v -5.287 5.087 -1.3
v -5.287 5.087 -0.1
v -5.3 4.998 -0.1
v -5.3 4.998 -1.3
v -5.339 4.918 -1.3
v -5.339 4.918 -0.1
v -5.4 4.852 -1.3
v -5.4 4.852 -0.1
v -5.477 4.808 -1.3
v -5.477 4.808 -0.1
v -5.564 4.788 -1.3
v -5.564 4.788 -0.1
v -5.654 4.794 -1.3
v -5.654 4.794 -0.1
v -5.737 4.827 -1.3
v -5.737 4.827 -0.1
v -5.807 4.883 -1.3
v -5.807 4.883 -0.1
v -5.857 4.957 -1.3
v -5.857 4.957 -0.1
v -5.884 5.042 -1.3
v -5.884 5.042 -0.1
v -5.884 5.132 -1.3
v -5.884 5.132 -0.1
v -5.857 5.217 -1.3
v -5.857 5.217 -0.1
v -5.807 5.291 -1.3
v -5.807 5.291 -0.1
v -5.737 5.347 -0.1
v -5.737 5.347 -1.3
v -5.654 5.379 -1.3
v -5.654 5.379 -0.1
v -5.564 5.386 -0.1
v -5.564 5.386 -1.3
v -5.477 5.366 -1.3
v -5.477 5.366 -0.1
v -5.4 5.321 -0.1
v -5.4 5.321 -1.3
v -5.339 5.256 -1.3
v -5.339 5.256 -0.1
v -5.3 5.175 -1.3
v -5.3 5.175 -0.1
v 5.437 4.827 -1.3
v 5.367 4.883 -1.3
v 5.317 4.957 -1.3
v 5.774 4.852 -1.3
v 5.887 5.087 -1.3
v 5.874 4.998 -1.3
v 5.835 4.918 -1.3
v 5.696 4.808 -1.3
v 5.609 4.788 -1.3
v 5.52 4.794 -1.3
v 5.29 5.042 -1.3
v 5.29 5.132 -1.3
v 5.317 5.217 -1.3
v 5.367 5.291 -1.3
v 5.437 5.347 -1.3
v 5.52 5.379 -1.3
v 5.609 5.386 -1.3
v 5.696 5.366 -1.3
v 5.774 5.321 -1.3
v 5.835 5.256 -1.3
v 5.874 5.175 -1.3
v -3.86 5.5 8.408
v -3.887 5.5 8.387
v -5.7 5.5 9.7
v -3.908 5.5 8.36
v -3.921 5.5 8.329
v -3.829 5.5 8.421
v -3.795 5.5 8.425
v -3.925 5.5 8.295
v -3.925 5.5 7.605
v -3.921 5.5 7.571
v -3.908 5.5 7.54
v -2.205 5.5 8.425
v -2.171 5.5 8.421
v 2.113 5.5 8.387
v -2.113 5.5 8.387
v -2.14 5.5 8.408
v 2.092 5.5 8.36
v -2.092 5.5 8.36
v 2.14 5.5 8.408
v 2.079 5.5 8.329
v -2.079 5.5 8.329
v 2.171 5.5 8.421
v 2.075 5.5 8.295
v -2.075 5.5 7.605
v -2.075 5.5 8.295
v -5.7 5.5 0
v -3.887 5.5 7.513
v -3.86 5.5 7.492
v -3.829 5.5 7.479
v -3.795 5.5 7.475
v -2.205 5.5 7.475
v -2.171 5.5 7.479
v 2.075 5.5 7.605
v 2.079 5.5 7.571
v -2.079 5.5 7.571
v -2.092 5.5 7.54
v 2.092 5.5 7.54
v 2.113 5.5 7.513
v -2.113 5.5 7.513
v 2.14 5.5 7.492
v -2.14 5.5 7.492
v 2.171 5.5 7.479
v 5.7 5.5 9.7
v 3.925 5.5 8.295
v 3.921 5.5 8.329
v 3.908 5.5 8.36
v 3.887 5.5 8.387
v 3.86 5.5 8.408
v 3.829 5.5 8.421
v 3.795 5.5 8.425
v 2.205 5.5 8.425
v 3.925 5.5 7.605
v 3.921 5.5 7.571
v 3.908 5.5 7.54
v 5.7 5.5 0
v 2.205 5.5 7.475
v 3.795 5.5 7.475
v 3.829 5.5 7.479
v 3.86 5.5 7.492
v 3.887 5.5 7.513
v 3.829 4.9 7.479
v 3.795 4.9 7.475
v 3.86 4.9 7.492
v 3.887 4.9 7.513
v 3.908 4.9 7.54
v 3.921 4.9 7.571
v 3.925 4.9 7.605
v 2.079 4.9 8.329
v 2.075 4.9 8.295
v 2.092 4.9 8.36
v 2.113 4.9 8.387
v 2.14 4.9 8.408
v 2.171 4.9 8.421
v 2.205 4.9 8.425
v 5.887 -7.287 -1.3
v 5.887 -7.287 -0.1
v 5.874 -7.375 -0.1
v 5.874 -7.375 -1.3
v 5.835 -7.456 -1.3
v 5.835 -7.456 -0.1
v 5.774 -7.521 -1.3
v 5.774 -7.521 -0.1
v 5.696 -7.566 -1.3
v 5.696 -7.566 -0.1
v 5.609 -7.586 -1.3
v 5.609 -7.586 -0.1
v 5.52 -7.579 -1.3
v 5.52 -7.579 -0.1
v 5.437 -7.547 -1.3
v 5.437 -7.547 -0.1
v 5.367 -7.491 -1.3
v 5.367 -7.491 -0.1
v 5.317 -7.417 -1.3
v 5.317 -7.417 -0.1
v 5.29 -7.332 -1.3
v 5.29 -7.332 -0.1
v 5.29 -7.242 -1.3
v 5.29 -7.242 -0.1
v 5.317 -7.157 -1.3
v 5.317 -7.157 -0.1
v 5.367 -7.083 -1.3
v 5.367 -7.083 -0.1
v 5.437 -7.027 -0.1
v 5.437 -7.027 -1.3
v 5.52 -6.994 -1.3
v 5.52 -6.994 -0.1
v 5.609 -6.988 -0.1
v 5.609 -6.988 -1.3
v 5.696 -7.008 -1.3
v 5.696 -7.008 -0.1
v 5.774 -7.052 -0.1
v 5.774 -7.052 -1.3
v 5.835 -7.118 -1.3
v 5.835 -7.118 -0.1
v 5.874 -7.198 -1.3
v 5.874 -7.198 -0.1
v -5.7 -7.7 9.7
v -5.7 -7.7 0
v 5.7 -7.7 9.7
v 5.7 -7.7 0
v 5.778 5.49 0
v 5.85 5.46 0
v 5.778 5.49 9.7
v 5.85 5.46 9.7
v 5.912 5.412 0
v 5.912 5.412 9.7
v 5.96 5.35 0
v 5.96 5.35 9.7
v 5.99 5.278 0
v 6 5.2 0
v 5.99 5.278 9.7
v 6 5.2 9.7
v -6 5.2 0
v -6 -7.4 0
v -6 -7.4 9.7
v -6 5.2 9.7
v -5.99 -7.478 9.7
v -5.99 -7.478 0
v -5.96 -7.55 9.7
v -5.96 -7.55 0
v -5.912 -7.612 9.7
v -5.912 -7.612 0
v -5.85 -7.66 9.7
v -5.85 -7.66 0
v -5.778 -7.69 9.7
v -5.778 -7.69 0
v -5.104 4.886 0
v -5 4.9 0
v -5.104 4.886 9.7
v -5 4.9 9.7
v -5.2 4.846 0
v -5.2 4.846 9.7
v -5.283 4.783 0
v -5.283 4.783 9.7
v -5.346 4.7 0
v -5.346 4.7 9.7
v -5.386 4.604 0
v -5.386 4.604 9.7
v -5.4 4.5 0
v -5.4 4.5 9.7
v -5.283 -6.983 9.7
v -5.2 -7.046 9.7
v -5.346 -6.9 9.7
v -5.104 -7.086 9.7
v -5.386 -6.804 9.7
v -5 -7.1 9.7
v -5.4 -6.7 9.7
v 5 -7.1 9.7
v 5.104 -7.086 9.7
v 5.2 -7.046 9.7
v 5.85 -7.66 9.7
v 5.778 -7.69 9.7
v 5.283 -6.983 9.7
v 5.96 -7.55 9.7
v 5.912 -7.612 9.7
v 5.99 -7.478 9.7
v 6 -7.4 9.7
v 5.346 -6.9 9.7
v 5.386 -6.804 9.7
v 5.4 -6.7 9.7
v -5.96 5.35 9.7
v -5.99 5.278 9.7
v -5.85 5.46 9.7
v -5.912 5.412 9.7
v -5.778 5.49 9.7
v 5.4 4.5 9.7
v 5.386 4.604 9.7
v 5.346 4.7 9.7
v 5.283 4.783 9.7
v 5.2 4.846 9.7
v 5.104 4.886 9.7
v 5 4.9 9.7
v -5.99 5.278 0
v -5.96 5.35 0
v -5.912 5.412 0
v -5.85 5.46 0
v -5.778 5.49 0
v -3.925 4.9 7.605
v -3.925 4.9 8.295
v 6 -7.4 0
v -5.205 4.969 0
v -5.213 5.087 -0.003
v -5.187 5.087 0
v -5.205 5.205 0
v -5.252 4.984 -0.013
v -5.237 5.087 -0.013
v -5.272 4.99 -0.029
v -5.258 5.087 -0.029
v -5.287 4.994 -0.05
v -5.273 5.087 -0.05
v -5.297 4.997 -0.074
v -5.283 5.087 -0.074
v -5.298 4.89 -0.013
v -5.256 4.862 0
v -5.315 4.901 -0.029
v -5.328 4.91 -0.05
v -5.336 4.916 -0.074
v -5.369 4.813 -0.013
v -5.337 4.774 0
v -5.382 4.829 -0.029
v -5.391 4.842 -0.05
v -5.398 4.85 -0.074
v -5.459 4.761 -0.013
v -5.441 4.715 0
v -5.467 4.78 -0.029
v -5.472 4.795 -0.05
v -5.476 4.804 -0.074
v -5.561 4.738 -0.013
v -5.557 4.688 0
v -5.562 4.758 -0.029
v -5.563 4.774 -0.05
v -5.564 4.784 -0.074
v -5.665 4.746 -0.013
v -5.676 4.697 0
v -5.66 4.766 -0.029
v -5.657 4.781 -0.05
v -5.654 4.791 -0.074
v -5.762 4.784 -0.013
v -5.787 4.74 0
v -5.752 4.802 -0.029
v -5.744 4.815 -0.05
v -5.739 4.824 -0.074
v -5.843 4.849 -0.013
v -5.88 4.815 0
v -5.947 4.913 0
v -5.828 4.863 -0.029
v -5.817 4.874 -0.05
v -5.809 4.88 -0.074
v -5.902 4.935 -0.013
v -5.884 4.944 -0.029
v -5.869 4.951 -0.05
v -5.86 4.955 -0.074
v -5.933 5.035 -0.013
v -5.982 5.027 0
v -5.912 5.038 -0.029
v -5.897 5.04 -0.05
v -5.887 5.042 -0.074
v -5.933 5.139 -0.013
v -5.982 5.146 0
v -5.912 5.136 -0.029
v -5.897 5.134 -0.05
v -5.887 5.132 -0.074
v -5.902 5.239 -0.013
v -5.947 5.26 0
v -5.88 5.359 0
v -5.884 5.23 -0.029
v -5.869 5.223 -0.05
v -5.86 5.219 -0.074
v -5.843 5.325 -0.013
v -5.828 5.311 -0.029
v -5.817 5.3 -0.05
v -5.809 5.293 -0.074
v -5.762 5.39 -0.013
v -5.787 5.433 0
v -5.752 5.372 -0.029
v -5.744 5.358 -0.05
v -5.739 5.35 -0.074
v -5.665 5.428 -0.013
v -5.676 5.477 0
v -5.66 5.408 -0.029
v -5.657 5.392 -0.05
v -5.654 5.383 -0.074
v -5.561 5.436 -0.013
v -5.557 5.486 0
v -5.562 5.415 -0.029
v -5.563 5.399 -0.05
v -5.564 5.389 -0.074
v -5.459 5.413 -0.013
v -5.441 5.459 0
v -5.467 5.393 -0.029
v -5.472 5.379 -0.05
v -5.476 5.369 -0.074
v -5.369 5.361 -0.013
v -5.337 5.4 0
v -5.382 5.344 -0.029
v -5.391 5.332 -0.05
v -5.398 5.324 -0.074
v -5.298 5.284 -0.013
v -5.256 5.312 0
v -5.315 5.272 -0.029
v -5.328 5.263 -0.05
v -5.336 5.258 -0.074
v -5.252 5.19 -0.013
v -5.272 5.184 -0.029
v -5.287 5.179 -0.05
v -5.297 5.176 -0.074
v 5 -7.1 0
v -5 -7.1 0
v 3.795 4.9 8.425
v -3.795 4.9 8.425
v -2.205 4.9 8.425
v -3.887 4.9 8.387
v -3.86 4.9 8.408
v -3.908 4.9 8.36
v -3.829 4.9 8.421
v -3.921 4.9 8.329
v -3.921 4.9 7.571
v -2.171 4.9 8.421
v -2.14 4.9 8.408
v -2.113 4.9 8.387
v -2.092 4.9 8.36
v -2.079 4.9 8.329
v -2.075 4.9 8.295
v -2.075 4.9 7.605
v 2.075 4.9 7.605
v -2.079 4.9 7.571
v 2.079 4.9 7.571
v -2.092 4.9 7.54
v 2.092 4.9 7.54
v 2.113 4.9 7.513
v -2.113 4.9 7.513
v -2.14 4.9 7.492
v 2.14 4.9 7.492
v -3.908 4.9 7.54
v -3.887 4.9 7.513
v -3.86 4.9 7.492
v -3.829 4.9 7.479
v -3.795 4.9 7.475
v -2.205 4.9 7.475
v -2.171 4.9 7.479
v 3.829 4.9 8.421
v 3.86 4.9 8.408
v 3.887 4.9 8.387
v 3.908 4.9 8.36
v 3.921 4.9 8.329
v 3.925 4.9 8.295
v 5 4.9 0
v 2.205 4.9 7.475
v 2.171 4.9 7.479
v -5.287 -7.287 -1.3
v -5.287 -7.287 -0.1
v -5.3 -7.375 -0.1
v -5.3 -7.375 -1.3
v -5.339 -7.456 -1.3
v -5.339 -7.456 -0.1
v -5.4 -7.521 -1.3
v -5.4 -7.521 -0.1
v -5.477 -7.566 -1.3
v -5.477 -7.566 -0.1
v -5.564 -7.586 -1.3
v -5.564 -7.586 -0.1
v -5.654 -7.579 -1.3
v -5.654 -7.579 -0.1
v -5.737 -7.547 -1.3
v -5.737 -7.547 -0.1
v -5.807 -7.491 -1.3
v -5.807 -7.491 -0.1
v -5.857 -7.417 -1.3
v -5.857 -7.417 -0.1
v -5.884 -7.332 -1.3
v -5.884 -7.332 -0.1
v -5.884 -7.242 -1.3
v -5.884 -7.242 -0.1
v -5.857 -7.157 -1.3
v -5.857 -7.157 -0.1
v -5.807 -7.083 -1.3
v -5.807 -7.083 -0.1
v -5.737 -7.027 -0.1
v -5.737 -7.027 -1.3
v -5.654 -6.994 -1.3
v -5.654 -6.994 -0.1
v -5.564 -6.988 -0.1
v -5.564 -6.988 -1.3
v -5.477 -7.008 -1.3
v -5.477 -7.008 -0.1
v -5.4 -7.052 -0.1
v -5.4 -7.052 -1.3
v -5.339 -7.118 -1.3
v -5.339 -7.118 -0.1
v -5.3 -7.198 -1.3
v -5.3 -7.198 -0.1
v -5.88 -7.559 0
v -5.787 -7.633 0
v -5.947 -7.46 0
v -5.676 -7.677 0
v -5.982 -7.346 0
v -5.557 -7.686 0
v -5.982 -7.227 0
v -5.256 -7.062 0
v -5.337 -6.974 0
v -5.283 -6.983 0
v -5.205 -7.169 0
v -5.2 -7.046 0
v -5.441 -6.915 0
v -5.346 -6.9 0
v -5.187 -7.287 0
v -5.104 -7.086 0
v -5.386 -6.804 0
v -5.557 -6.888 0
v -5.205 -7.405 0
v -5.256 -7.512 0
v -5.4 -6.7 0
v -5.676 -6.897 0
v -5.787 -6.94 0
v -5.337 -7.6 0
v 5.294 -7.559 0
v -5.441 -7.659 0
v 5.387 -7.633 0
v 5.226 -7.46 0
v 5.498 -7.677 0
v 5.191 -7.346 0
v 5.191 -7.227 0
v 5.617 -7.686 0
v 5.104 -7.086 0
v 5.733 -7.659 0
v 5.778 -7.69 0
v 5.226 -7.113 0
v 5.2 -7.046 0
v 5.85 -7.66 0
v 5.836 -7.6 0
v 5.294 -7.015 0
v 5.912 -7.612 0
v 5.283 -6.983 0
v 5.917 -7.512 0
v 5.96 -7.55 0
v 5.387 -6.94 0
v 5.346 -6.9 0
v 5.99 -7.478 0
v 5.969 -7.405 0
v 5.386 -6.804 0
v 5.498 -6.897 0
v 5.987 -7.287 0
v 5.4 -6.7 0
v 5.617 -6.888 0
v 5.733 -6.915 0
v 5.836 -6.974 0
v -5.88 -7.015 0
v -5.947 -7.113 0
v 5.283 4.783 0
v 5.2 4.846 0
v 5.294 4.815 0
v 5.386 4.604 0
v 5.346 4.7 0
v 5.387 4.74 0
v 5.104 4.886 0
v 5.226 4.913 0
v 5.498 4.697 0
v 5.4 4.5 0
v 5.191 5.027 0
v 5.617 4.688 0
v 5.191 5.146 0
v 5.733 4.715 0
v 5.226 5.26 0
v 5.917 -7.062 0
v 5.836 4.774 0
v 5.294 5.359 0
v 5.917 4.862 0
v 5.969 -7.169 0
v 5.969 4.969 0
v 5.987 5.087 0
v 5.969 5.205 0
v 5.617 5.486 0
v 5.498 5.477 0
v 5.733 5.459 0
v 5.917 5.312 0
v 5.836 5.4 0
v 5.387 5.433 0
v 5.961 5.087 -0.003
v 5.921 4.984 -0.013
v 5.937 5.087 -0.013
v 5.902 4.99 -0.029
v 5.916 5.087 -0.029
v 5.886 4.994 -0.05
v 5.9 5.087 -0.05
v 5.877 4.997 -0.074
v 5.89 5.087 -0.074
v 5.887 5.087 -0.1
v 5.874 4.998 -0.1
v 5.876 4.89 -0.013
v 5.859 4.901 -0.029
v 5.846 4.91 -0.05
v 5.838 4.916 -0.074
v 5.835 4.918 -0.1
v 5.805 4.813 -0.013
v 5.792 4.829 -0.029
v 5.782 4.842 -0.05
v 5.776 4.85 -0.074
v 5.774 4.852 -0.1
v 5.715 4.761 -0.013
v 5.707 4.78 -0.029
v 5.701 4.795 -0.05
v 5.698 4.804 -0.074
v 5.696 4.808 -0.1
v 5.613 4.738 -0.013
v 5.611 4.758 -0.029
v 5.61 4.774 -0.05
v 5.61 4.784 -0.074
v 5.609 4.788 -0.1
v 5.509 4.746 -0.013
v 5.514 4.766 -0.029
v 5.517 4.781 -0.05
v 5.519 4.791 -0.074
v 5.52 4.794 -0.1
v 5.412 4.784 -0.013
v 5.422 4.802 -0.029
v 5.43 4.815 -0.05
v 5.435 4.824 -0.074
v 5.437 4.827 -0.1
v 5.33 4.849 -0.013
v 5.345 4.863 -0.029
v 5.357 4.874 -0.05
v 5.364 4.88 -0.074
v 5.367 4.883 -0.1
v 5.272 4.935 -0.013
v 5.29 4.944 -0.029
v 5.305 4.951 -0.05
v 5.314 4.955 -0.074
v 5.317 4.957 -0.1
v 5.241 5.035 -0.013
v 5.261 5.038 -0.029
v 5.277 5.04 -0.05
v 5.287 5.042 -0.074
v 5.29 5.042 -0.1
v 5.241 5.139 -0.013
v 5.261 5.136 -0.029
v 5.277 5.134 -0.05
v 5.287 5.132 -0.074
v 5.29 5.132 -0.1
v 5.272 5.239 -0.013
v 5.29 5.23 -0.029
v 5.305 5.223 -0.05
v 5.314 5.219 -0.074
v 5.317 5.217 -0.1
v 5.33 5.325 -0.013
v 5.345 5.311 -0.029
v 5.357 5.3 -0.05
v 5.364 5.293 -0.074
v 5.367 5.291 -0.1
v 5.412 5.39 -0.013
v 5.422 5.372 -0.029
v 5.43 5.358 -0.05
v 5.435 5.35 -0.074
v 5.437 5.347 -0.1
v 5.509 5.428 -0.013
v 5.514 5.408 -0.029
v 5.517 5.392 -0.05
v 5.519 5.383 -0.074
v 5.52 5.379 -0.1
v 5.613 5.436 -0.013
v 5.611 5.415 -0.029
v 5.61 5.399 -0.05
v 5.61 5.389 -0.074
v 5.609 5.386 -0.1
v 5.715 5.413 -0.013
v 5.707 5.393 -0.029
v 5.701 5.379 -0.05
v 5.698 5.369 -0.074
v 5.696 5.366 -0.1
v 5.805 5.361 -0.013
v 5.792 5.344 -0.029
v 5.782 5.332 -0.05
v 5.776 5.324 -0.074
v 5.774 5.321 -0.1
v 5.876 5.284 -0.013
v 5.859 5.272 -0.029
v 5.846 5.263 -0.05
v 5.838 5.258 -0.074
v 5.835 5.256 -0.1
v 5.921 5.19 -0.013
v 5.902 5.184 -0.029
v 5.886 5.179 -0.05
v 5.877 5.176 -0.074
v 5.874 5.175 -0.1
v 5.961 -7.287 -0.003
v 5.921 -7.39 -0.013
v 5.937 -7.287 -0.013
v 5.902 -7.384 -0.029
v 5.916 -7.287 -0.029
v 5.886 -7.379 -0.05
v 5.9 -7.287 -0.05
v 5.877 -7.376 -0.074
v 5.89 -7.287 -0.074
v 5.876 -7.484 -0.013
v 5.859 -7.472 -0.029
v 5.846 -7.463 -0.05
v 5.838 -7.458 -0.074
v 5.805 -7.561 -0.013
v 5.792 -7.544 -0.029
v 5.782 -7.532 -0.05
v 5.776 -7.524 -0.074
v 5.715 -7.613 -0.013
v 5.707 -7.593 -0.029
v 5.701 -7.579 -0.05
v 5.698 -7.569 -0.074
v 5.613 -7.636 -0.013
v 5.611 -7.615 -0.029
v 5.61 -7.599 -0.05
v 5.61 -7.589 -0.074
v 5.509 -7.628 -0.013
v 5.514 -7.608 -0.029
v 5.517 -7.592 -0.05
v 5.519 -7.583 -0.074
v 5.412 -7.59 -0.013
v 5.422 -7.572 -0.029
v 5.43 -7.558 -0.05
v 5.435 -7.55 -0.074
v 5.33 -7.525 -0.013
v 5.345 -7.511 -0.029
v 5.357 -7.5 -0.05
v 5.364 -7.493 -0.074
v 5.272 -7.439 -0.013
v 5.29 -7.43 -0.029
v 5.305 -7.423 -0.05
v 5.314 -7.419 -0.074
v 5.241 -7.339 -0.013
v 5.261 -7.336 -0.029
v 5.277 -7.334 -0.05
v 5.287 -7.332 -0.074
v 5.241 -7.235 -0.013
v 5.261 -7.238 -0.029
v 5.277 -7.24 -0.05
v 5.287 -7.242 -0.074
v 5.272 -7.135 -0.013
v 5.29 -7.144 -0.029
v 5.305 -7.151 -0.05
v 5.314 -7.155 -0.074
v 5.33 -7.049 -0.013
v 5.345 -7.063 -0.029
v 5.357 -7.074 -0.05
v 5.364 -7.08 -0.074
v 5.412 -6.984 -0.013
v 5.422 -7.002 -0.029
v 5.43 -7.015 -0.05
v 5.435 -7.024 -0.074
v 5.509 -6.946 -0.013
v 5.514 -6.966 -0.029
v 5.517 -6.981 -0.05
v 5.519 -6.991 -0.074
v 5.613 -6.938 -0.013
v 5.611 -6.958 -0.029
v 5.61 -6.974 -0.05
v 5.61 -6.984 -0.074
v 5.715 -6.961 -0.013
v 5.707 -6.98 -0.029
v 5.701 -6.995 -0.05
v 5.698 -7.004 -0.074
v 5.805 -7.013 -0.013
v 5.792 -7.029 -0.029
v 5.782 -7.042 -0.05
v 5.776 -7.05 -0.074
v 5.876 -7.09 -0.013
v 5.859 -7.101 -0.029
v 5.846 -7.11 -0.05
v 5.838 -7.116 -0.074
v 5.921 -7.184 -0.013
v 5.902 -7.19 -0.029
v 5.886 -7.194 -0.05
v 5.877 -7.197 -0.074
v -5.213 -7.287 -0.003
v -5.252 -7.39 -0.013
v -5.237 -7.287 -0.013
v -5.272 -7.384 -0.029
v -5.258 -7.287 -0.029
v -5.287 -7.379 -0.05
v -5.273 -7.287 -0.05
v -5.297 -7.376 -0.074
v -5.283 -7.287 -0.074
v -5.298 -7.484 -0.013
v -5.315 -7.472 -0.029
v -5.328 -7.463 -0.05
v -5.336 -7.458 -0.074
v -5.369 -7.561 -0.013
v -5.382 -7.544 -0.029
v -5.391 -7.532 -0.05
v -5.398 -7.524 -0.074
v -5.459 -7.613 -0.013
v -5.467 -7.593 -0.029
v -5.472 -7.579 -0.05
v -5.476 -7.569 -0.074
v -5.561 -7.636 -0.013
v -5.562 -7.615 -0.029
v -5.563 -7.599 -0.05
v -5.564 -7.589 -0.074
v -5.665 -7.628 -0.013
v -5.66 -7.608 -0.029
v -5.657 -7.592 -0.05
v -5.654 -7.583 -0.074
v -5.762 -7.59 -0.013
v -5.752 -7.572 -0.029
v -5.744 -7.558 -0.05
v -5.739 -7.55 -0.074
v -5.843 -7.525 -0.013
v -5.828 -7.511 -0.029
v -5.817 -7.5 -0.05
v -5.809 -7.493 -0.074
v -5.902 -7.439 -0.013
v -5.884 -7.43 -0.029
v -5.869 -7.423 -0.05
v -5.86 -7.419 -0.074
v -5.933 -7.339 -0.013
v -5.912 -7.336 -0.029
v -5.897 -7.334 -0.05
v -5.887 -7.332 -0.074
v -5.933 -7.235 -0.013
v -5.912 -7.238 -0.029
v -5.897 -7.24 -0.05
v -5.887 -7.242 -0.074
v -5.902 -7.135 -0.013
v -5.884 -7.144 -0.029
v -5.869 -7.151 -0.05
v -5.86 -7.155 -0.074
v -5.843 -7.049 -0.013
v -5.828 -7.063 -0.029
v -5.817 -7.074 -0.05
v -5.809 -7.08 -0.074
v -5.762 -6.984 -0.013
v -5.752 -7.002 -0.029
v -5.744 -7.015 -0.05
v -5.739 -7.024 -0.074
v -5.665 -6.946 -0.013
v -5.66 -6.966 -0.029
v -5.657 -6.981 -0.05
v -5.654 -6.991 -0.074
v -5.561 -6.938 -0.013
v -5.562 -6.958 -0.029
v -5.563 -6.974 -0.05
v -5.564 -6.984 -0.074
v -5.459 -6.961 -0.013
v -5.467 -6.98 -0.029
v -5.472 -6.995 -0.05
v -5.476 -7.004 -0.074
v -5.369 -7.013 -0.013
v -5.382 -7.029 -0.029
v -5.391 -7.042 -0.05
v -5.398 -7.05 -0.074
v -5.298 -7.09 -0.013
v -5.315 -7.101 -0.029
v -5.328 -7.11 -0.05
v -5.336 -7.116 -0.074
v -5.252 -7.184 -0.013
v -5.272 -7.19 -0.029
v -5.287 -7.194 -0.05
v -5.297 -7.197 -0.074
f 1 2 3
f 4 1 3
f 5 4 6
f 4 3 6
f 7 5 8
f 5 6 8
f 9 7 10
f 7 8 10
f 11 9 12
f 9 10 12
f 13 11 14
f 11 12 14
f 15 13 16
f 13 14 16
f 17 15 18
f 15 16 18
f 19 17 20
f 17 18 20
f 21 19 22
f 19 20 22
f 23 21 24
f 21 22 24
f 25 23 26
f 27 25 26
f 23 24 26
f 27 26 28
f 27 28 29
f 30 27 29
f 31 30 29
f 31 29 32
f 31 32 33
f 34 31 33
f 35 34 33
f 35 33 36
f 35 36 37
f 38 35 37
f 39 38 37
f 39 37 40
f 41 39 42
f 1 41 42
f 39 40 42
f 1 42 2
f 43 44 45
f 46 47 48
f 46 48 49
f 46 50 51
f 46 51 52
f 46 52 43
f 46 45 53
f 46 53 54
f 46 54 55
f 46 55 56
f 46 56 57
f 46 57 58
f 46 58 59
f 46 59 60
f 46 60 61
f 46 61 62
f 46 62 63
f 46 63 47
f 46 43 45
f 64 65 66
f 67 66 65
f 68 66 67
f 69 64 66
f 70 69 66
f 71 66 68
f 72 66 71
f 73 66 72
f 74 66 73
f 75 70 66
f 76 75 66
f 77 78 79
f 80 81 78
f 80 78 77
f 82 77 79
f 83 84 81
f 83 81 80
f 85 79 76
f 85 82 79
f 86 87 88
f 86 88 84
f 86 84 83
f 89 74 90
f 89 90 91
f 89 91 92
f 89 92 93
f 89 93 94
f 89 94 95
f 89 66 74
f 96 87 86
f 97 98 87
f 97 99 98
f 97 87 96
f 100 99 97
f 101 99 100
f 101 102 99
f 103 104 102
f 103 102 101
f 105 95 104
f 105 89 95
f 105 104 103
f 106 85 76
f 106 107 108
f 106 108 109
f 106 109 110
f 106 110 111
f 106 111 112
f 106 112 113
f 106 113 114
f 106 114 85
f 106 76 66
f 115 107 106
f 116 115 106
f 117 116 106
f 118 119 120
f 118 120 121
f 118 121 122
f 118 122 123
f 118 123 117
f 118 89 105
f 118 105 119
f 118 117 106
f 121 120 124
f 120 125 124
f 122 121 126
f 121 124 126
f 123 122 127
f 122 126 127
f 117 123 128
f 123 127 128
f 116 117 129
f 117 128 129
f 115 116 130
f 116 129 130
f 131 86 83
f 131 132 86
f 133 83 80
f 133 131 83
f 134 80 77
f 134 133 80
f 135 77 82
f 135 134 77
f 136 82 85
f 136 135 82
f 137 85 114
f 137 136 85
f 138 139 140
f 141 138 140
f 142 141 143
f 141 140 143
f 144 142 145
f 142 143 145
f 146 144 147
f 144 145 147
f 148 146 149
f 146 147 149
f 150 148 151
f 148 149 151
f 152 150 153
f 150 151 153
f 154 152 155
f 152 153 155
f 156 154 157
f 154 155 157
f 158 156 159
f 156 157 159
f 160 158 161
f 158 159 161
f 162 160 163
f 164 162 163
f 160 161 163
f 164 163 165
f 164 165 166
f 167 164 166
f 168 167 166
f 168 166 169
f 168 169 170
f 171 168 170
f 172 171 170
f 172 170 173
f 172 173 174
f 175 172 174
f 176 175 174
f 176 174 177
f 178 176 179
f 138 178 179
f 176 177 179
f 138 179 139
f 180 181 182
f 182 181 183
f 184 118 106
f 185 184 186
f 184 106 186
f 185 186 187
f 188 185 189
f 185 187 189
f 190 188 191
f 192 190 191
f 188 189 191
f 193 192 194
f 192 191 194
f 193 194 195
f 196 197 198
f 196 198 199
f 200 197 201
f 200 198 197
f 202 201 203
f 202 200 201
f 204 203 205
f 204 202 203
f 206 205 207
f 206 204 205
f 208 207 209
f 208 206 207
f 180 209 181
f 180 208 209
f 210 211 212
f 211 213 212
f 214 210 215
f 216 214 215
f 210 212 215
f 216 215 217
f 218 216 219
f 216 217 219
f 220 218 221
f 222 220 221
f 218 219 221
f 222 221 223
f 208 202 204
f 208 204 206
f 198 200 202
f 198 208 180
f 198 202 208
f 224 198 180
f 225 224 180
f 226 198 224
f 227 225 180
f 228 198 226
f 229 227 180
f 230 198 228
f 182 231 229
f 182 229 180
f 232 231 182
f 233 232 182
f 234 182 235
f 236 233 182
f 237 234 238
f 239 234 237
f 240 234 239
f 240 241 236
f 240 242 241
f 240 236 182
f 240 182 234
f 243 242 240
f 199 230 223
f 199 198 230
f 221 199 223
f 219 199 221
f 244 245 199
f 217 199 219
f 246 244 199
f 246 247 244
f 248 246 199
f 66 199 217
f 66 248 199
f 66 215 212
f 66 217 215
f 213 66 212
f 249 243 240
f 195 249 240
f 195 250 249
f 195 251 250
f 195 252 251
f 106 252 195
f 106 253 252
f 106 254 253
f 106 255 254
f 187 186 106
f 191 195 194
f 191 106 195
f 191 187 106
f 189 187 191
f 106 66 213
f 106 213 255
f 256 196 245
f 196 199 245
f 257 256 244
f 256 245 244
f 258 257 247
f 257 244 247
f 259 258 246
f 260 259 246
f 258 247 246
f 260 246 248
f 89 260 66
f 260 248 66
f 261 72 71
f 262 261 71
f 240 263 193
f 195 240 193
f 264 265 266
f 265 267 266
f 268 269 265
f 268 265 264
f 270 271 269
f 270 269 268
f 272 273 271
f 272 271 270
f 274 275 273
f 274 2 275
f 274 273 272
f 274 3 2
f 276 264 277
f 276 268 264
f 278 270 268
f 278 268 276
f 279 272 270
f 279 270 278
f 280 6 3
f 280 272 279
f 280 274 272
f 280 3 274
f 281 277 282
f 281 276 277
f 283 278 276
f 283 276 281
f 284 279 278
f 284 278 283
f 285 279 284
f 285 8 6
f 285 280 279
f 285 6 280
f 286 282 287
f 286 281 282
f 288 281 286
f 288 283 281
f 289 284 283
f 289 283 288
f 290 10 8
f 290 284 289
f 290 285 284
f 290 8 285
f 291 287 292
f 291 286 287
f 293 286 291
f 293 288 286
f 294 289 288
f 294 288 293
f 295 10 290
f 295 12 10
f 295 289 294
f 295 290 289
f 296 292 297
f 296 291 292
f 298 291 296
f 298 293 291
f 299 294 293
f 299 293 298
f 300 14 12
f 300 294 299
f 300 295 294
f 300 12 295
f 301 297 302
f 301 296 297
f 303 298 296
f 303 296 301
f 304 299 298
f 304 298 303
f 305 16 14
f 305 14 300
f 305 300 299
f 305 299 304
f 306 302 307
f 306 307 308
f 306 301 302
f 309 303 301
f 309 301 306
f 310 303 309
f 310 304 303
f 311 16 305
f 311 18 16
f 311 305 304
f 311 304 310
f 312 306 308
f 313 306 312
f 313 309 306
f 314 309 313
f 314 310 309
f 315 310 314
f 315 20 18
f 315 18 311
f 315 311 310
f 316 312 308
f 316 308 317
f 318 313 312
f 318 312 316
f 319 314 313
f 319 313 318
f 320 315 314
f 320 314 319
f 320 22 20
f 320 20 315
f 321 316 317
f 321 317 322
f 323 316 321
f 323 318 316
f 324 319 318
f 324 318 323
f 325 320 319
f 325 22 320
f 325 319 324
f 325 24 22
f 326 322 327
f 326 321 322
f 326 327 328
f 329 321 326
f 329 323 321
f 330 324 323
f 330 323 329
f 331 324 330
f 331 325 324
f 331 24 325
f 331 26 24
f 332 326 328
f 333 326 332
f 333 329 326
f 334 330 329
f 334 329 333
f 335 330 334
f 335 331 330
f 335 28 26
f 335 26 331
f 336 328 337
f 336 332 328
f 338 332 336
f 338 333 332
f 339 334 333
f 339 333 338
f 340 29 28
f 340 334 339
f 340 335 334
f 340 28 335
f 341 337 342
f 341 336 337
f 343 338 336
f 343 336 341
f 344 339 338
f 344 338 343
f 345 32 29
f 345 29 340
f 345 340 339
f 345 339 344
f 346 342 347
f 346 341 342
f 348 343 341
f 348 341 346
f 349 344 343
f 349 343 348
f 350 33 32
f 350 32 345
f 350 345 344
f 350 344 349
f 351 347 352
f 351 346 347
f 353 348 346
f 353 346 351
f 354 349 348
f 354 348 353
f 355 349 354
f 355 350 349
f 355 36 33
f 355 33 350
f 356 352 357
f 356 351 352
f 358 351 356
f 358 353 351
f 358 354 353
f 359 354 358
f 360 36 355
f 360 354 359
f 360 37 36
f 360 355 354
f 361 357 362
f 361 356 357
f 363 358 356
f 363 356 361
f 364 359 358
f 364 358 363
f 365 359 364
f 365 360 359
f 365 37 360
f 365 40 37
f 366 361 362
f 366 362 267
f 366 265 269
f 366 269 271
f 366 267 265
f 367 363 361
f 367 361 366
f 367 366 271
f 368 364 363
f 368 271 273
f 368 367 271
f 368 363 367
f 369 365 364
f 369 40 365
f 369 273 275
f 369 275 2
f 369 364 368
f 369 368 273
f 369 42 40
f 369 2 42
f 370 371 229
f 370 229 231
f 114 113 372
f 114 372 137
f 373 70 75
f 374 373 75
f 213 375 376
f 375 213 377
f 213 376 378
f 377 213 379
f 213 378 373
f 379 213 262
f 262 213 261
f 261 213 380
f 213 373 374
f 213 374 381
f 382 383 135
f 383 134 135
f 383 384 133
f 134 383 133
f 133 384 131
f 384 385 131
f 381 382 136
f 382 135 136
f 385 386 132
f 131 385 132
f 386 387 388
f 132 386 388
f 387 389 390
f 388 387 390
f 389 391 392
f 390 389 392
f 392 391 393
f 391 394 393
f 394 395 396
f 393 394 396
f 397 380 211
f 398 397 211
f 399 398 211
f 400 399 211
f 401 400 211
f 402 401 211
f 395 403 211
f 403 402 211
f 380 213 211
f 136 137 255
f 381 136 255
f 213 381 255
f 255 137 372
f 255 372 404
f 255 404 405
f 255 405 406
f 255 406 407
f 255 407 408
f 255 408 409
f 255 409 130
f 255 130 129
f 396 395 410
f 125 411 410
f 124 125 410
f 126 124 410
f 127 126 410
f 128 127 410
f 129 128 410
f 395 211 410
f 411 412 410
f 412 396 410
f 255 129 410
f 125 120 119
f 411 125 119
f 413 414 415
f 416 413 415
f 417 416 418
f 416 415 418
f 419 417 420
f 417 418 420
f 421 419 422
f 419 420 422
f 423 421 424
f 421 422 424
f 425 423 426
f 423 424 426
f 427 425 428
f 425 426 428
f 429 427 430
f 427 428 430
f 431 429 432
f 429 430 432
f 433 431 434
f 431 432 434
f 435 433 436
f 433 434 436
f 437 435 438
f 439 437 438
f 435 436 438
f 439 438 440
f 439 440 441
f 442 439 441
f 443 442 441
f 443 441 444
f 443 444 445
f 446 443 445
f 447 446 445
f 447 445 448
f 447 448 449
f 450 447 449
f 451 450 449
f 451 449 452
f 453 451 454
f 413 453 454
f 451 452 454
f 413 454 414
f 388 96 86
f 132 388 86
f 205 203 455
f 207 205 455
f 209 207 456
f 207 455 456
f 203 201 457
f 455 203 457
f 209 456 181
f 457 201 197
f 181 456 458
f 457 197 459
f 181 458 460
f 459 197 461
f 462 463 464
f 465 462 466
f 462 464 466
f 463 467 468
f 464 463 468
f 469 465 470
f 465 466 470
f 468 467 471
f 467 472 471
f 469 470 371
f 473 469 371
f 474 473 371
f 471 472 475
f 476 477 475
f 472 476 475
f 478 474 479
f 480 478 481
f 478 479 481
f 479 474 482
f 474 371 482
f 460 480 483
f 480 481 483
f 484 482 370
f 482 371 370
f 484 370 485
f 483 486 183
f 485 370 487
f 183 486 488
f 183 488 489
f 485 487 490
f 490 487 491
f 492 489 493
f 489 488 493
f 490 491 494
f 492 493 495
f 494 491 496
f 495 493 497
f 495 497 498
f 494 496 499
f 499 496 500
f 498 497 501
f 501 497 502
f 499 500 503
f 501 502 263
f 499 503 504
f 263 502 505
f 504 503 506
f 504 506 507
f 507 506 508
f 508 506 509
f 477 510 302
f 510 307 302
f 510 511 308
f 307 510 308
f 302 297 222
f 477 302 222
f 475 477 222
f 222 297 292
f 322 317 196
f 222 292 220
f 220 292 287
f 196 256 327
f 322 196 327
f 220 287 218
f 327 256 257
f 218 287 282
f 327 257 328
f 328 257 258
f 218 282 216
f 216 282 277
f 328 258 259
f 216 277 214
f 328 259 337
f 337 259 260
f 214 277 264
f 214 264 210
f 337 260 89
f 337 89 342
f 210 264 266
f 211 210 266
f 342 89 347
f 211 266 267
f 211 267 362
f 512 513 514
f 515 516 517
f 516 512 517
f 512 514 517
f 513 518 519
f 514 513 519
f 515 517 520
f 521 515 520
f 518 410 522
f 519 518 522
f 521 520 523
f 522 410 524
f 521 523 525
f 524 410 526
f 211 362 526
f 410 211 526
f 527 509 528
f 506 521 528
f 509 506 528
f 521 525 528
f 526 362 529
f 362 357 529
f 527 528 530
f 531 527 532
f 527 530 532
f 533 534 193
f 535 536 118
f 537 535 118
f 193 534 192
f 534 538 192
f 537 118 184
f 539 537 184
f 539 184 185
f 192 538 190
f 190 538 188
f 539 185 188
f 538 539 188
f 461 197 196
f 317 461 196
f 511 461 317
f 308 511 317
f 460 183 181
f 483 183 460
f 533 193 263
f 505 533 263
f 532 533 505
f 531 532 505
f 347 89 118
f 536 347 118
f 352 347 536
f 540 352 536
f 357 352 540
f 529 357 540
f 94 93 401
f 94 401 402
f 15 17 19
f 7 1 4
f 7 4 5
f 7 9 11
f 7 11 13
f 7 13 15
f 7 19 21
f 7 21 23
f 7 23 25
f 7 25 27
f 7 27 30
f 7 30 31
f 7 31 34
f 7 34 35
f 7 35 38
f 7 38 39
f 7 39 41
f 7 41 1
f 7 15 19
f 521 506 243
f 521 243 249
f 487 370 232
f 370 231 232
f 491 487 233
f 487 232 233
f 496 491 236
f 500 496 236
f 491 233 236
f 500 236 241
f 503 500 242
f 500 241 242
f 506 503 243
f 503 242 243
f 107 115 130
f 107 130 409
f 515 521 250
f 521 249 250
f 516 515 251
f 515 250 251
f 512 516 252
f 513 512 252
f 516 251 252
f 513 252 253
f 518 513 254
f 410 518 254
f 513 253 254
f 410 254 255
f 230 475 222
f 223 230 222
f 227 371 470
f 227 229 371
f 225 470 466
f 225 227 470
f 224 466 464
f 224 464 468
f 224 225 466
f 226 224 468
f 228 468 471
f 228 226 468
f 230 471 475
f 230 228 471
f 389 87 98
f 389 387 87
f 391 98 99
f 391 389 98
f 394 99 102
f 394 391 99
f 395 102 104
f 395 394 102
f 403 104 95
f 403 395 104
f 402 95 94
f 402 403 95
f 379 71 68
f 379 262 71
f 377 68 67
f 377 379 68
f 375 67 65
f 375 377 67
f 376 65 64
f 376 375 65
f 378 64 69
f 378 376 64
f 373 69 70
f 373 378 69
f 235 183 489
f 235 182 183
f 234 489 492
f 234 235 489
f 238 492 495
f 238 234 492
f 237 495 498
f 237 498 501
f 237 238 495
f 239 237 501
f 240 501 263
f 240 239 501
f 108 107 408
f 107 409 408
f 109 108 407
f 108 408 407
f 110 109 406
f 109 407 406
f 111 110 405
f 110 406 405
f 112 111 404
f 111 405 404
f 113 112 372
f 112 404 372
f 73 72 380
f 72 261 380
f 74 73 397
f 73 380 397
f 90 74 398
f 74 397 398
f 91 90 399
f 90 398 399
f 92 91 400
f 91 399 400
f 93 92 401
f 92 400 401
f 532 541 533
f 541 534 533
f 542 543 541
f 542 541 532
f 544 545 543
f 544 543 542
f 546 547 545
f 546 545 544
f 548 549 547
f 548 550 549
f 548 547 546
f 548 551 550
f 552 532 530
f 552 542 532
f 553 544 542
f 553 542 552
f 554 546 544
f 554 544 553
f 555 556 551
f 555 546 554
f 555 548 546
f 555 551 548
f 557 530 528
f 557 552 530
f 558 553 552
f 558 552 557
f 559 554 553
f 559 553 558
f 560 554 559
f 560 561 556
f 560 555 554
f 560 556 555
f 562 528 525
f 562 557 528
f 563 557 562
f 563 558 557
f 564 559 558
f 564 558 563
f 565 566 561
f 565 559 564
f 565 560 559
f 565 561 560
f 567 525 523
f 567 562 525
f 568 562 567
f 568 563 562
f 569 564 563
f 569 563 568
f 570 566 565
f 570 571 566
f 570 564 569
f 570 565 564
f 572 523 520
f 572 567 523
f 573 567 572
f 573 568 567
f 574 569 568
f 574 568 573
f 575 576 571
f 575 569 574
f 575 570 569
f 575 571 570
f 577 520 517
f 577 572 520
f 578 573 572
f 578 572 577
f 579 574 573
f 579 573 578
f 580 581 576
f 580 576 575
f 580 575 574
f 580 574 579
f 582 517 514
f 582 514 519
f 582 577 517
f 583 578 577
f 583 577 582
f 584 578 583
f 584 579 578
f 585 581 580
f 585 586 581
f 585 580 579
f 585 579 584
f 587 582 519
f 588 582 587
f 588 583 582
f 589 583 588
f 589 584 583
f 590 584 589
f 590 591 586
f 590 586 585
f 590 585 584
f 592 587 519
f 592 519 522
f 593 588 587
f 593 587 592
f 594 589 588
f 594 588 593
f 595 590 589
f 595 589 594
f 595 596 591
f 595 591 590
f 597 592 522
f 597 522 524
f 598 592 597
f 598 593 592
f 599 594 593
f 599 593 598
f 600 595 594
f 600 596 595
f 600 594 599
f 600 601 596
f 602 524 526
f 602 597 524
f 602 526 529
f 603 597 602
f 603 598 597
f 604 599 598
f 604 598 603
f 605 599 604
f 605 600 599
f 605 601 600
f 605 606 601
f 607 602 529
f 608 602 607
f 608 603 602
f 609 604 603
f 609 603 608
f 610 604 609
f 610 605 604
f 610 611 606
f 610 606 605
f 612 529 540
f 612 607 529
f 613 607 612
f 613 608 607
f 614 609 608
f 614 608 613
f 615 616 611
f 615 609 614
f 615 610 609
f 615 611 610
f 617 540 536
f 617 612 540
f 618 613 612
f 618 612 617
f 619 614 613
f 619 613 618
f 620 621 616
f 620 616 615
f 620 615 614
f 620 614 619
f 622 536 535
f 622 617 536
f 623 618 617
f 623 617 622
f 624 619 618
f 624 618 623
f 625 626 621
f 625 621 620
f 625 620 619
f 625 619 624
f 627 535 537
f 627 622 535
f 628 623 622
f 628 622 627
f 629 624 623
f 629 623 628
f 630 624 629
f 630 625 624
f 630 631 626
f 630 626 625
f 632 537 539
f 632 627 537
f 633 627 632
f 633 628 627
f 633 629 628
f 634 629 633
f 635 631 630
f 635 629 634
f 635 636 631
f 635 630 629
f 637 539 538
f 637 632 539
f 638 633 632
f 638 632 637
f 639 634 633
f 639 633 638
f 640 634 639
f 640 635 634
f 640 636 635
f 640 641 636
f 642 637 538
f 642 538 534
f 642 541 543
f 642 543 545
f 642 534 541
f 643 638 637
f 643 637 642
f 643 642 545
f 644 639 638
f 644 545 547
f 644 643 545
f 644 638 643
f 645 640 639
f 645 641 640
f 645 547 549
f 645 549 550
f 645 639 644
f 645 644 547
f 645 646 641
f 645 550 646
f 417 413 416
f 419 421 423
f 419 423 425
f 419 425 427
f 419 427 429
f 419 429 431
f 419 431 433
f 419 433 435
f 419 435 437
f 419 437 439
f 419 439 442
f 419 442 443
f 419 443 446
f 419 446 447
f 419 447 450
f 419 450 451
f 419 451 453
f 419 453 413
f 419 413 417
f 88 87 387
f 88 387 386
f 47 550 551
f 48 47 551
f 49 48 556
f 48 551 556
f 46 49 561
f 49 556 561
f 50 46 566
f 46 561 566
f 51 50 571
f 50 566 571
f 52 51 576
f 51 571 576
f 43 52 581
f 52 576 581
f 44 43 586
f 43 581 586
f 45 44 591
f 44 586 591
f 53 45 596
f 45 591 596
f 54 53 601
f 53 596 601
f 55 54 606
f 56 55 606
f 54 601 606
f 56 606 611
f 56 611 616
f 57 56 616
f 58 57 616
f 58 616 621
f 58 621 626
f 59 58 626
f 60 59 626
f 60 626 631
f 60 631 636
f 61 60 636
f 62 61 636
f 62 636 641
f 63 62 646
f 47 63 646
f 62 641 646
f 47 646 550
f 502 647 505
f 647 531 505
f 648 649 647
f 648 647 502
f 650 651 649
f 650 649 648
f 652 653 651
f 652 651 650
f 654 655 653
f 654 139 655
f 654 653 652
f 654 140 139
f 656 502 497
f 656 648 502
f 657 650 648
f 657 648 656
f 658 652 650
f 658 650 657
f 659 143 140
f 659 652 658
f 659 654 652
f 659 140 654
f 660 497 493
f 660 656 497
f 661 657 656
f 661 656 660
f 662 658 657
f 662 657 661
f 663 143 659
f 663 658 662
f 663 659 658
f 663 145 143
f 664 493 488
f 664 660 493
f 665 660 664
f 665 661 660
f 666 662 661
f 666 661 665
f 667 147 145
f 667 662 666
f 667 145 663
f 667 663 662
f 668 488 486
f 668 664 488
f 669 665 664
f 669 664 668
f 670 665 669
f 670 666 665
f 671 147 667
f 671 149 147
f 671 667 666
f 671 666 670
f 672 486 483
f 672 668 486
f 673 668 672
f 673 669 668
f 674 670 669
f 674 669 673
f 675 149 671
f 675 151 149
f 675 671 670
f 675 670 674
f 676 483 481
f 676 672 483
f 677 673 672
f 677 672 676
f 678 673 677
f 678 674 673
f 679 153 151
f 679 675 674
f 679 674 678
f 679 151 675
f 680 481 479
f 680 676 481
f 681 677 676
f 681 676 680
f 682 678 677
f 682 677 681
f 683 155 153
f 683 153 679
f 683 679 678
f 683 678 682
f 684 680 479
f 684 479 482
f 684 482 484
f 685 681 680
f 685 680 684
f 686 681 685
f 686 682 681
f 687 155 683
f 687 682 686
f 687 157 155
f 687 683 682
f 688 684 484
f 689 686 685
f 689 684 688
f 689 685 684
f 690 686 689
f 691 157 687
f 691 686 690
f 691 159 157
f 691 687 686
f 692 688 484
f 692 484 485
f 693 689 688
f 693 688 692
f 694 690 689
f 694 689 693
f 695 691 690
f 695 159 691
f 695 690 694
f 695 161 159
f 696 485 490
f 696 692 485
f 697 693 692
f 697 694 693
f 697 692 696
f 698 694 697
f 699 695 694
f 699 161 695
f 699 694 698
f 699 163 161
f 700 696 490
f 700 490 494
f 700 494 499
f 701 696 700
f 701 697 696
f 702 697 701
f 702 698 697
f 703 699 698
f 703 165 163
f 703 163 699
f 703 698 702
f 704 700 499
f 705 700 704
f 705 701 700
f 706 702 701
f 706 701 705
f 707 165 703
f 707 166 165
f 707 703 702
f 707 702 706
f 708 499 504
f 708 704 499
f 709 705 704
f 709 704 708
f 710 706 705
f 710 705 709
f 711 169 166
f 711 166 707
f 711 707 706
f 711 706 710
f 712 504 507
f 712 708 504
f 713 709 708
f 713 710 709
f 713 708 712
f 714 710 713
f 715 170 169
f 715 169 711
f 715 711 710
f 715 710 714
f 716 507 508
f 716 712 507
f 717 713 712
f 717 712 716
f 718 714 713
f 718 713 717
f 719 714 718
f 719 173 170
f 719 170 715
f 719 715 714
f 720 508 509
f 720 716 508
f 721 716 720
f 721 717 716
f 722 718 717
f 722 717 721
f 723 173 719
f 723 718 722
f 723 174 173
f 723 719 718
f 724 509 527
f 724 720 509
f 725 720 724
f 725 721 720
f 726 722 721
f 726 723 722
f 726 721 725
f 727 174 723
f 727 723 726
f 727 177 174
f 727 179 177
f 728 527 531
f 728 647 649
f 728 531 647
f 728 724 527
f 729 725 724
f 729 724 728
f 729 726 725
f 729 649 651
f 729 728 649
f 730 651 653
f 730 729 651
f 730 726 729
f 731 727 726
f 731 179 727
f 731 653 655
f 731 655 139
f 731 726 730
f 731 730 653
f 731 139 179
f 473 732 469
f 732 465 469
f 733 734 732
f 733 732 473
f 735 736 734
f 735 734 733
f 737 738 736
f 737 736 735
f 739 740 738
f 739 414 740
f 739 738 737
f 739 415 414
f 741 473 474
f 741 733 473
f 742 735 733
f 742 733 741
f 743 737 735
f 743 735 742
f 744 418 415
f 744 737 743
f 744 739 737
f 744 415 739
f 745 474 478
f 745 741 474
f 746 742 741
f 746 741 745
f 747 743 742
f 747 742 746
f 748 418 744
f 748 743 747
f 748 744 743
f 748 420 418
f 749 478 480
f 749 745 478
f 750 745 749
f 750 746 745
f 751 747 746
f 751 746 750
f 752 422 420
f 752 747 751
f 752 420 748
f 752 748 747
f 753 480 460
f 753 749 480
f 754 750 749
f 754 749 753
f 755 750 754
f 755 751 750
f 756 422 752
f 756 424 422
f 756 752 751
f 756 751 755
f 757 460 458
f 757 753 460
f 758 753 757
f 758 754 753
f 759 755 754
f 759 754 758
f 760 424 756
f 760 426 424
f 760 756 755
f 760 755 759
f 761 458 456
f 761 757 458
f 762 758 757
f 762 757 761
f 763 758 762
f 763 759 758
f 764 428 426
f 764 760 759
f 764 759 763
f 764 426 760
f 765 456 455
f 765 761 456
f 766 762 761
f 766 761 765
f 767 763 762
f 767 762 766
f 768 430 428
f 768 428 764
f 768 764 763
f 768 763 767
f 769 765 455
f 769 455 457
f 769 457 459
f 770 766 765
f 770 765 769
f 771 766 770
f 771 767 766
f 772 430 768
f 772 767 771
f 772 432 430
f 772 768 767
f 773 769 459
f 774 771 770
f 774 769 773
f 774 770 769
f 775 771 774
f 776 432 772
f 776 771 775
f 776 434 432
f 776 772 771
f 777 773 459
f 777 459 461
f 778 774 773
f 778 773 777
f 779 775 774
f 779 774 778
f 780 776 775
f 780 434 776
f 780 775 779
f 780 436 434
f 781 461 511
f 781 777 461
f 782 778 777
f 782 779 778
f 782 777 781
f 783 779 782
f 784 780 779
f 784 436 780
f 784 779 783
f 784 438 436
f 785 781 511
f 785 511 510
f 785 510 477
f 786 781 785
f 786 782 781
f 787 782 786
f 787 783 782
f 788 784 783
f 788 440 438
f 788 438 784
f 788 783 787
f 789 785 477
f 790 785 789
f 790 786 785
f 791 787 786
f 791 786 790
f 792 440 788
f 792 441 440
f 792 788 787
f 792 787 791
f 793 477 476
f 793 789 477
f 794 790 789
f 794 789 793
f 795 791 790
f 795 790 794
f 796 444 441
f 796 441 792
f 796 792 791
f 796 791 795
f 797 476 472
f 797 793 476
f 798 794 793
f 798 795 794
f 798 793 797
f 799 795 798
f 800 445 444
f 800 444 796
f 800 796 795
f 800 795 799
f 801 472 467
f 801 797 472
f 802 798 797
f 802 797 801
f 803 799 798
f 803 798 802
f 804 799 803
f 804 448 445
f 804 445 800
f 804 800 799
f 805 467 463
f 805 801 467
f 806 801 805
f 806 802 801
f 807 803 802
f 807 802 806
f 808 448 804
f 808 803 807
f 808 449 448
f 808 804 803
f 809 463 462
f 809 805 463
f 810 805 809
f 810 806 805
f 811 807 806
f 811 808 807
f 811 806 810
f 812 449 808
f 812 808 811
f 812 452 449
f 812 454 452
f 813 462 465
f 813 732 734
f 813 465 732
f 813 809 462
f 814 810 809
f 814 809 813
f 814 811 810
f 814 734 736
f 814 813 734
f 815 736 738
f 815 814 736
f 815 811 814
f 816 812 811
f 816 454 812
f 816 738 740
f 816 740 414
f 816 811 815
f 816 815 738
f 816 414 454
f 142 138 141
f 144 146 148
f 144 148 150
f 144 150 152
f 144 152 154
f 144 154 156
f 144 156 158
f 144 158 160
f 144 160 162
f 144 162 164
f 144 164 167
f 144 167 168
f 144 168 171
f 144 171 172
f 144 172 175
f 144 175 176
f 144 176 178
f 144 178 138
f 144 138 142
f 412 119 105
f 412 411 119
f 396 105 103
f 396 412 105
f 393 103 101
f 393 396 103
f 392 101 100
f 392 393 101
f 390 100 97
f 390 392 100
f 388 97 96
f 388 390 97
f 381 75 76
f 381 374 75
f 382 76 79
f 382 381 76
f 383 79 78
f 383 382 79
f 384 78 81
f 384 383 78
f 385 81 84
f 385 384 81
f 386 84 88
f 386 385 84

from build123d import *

# Parameters (mm, degrees)
SKETCH005_W     = 12
SKETCH005_H     = 13.2
SKETCH005_W_2   = 10.8
SKETCH005_H_2   = 12
PAD003_DEPTH    = 9.7
FILLET005_R     = 0.3
FILLET006_R     = 0.4
SKETCH006_W     = 1.85
SKETCH006_H     = 0.95
POCKET002_DEPTH = 0.6
FILLET007_R     = 0.13
SKETCH007_R     = 0.3
PAD004_DEPTH    = 1.3
FILLET008_R     = 0.1


with BuildPart() as part:
    # Sketch005 → Pad003 (new body)
    with BuildSketch(Plane.XY):
        with Locations((0, -1.1)):
            Rectangle(SKETCH005_W, SKETCH005_H)
        with Locations((0, -1.1)):
            Rectangle(SKETCH005_W_2, SKETCH005_H_2, mode=Mode.SUBTRACT)
    extrude(amount=PAD003_DEPTH)

    # Fillet005
    fillet005_edges = [part.edges().sort_by_distance(p)[0] for p in [
        (-6, 5.5, 4.85),
        (-6, -7.7, 4.85),
        (6, -7.7, 4.85),
        (6, 5.5, 4.85),
    ]]
    fillet(fillet005_edges, radius=FILLET005_R)

    # Fillet006
    fillet006_edges = [part.edges().sort_by_distance(p)[0] for p in [
        (-5.4, -7.1, 4.85),
        (-5.4, 4.9, 4.85),
        (5.4, -7.1, 4.85),
        (5.4, 4.9, 4.85),
    ]]
    fillet(fillet006_edges, radius=FILLET006_R)

    # Sketch006 (on Face10 of Fillet006) → Pocket002 (cut)
    with BuildSketch(Plane(origin=(0, 5.5, 0), x_dir=(-1, 0, 0), z_dir=(0, 1, 0))):
        with Locations((-3, 7.95)):
            Rectangle(SKETCH006_W, SKETCH006_H)
    pocket002 = extrude(amount=-POCKET002_DEPTH, mode=Mode.SUBTRACT)

    # Mirrored001: Pocket002 across Sketch006 V_Axis
    add(pocket002.mirror(Plane(origin=(0, 5.5, 0), x_dir=(0, 1, 0), z_dir=(-1, 0, 0))), mode=Mode.SUBTRACT)

    # Fillet007
    fillet007_edges = [part.edges().sort_by_distance(p)[0] for p in [
        (2.075, 5.2, 8.425),
        (2.075, 5.2, 7.475),
        (-3.925, 5.2, 7.475),
        (-3.925, 5.2, 8.425),
        (-2.075, 5.2, 8.425),
        (-2.075, 5.2, 7.475),
        (3.925, 5.2, 7.475),
        (3.925, 5.2, 8.425),
    ]]
    fillet(fillet007_edges, radius=FILLET007_R)

    # Sketch007 (on Face10 of Fillet007) → Pad004 (join)
    with BuildSketch(Plane(origin=(0, 0, 0), x_dir=(1, 0, 0), z_dir=(0, 0, -1))):
        with Locations((-5.586863, 7.286863)):
            Circle(SKETCH007_R)
        with Locations((5.586863, 7.286863)):
            Circle(SKETCH007_R)
        with Locations((-5.586863, -5.086863)):
            Circle(SKETCH007_R)
        with Locations((5.586863, -5.086863)):
            Circle(SKETCH007_R)
    extrude(amount=PAD004_DEPTH)

    # Fillet008
    fillet008_edges = [part.edges().sort_by_distance(p)[0] for p in [
        (5.286863, 5.086863, 0),
        (-5.886863, 5.086863, 0),
        (-5.886863, -7.286863, 0),
        (5.286863, -7.286863, 0),
    ]]
    fillet(fillet008_edges, radius=FILLET008_R)


solid = part.part
